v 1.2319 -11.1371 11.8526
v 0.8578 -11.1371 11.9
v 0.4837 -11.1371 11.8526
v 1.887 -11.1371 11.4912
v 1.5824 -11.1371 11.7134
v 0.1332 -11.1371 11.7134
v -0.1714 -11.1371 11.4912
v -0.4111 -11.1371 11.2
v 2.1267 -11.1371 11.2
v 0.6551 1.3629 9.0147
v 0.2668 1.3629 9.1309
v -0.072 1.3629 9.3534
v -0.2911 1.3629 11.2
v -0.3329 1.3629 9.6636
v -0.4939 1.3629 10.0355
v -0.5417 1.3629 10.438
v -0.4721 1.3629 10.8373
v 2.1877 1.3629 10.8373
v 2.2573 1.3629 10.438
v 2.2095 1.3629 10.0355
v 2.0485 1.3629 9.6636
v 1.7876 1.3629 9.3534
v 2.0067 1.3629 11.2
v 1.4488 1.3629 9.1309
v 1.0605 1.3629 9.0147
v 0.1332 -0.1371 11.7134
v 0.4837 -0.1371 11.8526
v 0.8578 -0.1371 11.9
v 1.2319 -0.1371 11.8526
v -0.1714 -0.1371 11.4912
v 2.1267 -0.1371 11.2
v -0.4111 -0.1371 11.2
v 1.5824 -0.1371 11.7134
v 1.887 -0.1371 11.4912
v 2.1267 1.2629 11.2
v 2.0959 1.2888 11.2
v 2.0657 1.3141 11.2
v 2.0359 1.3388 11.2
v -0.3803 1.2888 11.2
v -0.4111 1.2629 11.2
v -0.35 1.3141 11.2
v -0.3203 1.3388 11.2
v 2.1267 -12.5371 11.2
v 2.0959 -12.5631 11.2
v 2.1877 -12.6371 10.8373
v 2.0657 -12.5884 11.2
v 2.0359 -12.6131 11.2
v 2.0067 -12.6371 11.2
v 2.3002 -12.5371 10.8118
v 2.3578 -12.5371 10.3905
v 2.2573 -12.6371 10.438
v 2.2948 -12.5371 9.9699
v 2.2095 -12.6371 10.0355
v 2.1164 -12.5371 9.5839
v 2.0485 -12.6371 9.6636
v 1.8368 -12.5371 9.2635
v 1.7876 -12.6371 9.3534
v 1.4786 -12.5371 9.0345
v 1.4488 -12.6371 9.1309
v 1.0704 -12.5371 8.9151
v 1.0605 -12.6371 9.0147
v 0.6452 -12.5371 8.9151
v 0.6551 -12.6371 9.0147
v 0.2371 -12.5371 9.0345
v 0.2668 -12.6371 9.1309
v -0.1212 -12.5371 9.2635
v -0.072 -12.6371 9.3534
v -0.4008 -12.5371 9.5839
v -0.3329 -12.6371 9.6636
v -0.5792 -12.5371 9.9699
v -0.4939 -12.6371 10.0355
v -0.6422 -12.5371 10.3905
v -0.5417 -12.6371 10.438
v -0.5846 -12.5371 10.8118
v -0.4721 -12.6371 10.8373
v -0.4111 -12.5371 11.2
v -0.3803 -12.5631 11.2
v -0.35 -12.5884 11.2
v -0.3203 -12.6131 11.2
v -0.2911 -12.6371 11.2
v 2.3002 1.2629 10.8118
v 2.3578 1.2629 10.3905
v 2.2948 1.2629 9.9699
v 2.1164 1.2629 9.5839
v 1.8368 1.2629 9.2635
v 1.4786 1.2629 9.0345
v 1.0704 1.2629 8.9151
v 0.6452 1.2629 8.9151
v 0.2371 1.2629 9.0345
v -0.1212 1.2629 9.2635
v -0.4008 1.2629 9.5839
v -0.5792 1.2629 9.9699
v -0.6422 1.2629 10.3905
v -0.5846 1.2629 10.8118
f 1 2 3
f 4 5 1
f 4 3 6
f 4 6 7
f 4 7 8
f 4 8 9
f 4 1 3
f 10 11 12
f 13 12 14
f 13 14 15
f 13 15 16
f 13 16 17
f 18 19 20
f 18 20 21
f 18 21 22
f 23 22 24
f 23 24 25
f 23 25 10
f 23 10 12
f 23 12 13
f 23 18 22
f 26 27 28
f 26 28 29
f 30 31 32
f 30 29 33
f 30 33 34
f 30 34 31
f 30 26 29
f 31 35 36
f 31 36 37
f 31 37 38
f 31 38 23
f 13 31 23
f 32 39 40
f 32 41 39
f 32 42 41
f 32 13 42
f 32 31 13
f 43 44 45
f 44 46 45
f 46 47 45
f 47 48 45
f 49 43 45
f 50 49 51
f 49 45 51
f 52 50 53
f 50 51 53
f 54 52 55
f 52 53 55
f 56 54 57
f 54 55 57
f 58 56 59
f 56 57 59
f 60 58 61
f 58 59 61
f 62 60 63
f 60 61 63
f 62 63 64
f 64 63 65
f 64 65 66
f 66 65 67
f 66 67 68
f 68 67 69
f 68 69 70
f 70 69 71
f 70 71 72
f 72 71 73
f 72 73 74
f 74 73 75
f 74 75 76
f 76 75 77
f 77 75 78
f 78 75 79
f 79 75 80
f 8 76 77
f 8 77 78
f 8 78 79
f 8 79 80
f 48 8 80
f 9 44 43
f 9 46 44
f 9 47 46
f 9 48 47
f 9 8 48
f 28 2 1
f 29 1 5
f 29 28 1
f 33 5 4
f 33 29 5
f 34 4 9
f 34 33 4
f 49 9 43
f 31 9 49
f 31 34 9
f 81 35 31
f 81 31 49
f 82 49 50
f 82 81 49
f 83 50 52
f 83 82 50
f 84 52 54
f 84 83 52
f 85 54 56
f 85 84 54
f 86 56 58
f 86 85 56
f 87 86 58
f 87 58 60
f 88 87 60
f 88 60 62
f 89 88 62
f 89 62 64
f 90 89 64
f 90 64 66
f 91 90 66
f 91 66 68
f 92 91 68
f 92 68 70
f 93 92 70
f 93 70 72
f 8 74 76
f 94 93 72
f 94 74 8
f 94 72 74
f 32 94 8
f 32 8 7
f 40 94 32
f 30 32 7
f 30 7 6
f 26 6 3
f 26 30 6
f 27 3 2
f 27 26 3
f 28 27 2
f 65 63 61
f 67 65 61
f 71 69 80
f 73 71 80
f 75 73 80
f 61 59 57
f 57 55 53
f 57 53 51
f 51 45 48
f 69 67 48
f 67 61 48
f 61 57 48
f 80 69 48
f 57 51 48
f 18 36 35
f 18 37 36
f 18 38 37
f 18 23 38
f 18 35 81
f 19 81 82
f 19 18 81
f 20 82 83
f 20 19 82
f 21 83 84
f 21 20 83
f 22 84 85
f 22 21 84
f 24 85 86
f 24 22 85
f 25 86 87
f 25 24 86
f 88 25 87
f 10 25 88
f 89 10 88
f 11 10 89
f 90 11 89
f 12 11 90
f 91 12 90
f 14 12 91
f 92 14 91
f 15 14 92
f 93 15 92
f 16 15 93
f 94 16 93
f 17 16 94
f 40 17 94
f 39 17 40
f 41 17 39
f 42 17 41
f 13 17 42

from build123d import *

# Parameters (mm, degrees)
ESQUISSE1_W             = 1.5
ESQUISSE1_H             = 14
ENL_V_START             = -1.5
ENL_V_MAT_EXTRU_1_DEPTH = 1.5
ENL_V_MAT_EXTRU_2_DEPTH = 1.5
CHANFREIN1_SIZE         = 0.1
CHANFREIN2_SIZE         = 0.1


with BuildPart() as part:
    # Esquisse1 → Révolution1 (revolve)
    with BuildSketch(Plane(origin=(0, 0, 10.4), x_dir=(-1, 0, 0), z_dir=(0, 0, -1))):
        with Locations((-1.607807721, -5.637142552)):
            Rectangle(ESQUISSE1_W, ESQUISSE1_H)
    revolve(axis=Axis((0.857807721, -12.637142552, 10.4), (0, 1, 0)))

    # Esquisse2 → Enlèv. mat.-Extru.1 (cut)
    with BuildSketch(Plane(origin=(0, 1.362857448, 0), x_dir=(-1, 0, 0), z_dir=(0, 1, 0)).offset(ENL_V_START)):
        with BuildLine():
            Line((-2.12666531, 11.2), (0.411050198, 11.2))
            ThreePointArc((0.411050198, 11.2), (-0.857807556, 11.9), (-2.12666531, 11.2))
        make_face()
    extrude(amount=ENL_V_MAT_EXTRU_1_DEPTH, mode=Mode.SUBTRACT)

    # Esquisse3 → Enlèv. mat.-Extru.2 (cut)
    with BuildSketch(Plane.XZ.offset(12.637142552)):
        with BuildLine():
            Line((-0.41105011, 11.2), (2.126665398, 11.2))
            ThreePointArc((2.126665398, 11.2), (0.857807644, 11.9), (-0.41105011, 11.2))
        make_face()
    extrude(amount=-ENL_V_MAT_EXTRU_2_DEPTH, mode=Mode.SUBTRACT)

    # Chanfrein1
    chanfrein1_edges = [part.edges().sort_by_distance(p)[0] for p in [
        (0.44144652, 1.362857448, 8.958943668),
    ]]
    chamfer(chanfrein1_edges, length=CHANFREIN1_SIZE)

    # Chanfrein2
    chanfrein2_edges = [part.edges().sort_by_distance(p)[0] for p in [
        (0.441446497, -12.637142552, 8.958943675),
    ]]
    chamfer(chanfrein2_edges, length=CHANFREIN2_SIZE)


solid = part.part
